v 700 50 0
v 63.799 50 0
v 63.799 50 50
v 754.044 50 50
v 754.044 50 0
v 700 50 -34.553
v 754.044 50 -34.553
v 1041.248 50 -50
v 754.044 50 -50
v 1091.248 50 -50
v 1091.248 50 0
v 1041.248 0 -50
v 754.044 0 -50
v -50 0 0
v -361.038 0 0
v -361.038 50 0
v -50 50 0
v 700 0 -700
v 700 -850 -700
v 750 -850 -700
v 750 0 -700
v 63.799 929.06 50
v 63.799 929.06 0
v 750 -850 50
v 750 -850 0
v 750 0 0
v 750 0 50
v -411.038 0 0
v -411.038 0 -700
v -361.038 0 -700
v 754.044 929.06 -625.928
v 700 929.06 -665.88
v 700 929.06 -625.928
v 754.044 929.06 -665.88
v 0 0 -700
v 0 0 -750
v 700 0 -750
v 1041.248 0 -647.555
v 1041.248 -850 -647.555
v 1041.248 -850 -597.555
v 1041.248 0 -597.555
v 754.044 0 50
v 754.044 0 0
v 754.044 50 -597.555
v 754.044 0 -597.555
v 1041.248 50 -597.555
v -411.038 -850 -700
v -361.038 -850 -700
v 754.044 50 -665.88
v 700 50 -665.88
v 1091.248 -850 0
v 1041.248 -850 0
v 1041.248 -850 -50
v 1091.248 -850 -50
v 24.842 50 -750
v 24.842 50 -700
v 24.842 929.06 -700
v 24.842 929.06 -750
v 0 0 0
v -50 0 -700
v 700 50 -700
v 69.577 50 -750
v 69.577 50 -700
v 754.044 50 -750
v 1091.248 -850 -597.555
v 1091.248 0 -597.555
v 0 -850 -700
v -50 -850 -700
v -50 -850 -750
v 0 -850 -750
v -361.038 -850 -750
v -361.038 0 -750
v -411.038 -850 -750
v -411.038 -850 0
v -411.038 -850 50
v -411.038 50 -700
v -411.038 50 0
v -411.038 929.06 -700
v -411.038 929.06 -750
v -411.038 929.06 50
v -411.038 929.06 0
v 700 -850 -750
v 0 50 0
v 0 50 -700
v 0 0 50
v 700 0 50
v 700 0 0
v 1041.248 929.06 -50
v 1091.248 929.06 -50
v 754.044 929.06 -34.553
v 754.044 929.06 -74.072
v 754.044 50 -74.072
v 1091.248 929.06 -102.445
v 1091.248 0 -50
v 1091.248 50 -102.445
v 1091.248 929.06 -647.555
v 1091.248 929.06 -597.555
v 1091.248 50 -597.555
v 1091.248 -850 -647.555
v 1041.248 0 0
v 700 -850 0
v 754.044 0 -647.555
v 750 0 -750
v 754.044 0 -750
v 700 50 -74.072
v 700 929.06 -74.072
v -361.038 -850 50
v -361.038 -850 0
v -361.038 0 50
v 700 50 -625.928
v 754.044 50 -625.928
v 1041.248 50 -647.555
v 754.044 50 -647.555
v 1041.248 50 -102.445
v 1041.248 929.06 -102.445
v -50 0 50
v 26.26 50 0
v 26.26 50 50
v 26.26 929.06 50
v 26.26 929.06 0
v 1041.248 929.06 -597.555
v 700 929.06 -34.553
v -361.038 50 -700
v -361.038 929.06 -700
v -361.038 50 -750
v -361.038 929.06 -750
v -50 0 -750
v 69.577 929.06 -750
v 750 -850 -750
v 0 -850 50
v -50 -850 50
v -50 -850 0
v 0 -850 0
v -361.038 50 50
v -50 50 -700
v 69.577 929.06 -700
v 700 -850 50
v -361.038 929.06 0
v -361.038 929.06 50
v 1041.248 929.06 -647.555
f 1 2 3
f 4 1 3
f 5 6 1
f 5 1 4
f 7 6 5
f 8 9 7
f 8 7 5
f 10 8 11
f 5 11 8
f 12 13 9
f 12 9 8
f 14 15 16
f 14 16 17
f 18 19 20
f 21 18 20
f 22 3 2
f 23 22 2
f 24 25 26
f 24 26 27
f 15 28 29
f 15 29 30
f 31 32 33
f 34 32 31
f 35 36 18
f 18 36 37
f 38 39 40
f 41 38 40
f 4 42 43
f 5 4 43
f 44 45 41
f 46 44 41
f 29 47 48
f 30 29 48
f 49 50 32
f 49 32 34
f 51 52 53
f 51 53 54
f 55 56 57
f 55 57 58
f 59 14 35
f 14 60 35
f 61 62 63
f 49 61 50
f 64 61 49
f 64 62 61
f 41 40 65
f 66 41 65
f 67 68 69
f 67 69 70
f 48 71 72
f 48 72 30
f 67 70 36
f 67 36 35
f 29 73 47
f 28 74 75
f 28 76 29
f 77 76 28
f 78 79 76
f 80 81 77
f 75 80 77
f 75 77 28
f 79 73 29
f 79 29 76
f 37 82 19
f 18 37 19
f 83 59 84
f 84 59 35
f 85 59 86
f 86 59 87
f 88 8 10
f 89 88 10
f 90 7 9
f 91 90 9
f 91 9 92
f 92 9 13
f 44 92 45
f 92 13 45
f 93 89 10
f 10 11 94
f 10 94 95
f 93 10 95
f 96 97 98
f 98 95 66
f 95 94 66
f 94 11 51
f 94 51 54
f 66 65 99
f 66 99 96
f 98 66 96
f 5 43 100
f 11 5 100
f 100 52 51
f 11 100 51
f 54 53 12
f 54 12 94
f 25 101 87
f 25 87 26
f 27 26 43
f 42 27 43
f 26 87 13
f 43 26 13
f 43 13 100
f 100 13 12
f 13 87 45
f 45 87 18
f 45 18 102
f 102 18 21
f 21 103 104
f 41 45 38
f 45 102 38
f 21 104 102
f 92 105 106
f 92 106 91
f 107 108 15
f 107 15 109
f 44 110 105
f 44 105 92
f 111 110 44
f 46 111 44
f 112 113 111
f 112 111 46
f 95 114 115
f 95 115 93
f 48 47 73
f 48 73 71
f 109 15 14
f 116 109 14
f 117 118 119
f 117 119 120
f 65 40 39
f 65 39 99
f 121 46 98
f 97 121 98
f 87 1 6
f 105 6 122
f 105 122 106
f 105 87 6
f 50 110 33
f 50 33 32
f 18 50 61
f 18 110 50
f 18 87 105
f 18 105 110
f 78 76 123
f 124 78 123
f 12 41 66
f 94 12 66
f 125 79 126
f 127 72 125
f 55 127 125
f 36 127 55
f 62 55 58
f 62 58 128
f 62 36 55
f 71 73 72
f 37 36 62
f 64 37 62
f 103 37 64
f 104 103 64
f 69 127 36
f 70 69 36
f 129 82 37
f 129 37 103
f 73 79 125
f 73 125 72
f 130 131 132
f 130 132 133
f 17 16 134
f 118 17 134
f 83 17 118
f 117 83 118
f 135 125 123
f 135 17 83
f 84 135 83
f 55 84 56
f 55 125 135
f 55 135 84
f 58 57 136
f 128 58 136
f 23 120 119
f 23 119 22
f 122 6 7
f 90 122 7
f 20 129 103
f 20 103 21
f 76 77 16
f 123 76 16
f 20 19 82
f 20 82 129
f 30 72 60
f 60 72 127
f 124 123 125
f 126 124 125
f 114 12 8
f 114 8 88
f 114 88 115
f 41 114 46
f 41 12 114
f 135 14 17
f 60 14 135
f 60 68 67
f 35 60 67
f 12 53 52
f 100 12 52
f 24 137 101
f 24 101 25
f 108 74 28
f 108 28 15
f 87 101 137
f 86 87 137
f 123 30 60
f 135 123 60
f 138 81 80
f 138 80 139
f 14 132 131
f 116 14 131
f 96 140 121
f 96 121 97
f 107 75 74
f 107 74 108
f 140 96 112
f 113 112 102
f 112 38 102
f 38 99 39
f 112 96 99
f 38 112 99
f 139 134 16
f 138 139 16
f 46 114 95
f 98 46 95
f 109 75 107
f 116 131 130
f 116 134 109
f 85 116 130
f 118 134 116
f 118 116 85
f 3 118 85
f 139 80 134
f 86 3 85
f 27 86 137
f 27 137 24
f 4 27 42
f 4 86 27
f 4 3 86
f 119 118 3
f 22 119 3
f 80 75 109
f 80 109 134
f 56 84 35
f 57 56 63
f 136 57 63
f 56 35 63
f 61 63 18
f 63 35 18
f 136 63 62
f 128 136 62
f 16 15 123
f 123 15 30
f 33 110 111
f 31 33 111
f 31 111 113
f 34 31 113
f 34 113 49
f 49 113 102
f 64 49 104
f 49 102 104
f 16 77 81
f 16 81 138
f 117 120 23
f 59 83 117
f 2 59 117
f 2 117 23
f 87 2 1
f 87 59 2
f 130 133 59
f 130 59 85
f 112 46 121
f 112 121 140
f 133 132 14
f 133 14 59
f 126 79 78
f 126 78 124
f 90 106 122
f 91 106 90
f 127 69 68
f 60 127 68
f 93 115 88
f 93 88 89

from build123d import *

# Parameters (mm, degrees)
CROQUIS1_W              = 700
CROQUIS1_H              = 700
CROQUIS1_W_2            = 287.203756055
CROQUIS1_H_2            = 547.555321307
CROQUIS1_W_3            = 311.038292855
SALIENTE_EXTRUIR1_DEPTH = 50
CROQUIS2_W              = 50
CROQUIS2_H              = 50
SALIENTE_EXTRUIR2_DEPTH = 850
CROQUIS3_W              = 50
CROQUIS3_H              = 50
CROQUIS3_H_2            = 52.444678691
CROQUIS3_W_2            = 44.735144292
CROQUIS3_W_3            = 37.538527074
CROQUIS3_W_4            = 54.044332967
CROQUIS3_H_3            = 39.518840668
CROQUIS3_W_5            = 54.044332968
CROQUIS3_H_4            = 39.951892275
SALIENTE_EXTRUIR3_DEPTH = 879.0597314
CROQUIS4_W              = 50
CROQUIS4_H              = 50
SALIENTE_EXTRUIR4_DEPTH = 850


with BuildPart() as part:
    # Croquis1 → Saliente-Extruir1 (new body)
    with BuildSketch(Plane(origin=(0, 0, 0), x_dir=(1, 0, 0), z_dir=(0, 1, 0))):
        Polygon((-45.955667033, -50), (754.044332967, -50), (754.044332967, 0), (1091.248089022, 0), (1091.248089022, 52.444678693), (1091.248089022, 647.555321307), (754.044332967, 647.555321307), (754.044332967, 750), (-45.955667033, 750), (-411.038292855, 750), (-411.038292855, -50), align=None)
        with Locations((350, 350)):
            Rectangle(CROQUIS1_W, CROQUIS1_H, mode=Mode.SUBTRACT)
        with Locations((897.646210995, 323.777660653)):
            Rectangle(CROQUIS1_W_2, CROQUIS1_H_2, mode=Mode.SUBTRACT)
        with Locations((-205.519146428, 350)):
            Rectangle(CROQUIS1_W_3, CROQUIS1_H, mode=Mode.SUBTRACT)
    extrude(amount=SALIENTE_EXTRUIR1_DEPTH)

    # Croquis2 → Saliente-Extruir2 (add)
    with BuildSketch(Plane.XZ):
        with Locations((-25, 25)):
            Rectangle(CROQUIS2_W, CROQUIS2_H)
        with Locations((725, 25)):
            Rectangle(CROQUIS2_W, CROQUIS2_H)
        with Locations((725, -725)):
            Rectangle(CROQUIS2_W, CROQUIS2_H)
        with Locations((-25, -725)):
            Rectangle(CROQUIS2_W, CROQUIS2_H)
    extrude(amount=SALIENTE_EXTRUIR2_DEPTH)

    # Croquis3 → Saliente-Extruir3 (add)
    with BuildSketch(Plane(origin=(0, 50, 0), x_dir=(1, 0, 0), z_dir=(0, 1, 0))):
        with Locations((-386.038292855, 725)):
            Rectangle(CROQUIS3_W, CROQUIS3_H)
        with Locations((1066.248089022, 622.555321307)):
            Rectangle(CROQUIS3_W, CROQUIS3_H)
        with Locations((1066.248089022, 76.222339346)):
            Rectangle(CROQUIS3_W, CROQUIS3_H_2)
        with Locations((-386.038292855, -25)):
            Rectangle(CROQUIS3_W, CROQUIS3_H)
        with Locations((47.209644204, 725)):
            Rectangle(CROQUIS3_W_2, CROQUIS3_H)
        with Locations((45.029305303, -25)):
            Rectangle(CROQUIS3_W_3, CROQUIS3_H)
        with Locations((727.022166484, 54.312727654)):
            Rectangle(CROQUIS3_W_4, CROQUIS3_H_3)
        with Locations((727.022166484, 645.903798151)):
            Rectangle(CROQUIS3_W_5, CROQUIS3_H_4)
    extrude(amount=SALIENTE_EXTRUIR3_DEPTH)

    # Croquis4 → Saliente-Extruir4 (add)
    with BuildSketch(Plane.XZ):
        with Locations((-386.038292855, 25)):
            Rectangle(CROQUIS4_W, CROQUIS4_H)
        with Locations((-386.038292855, -725)):
            Rectangle(CROQUIS4_W, CROQUIS4_H)
        with Locations((1066.248089022, -622.555321307)):
            Rectangle(CROQUIS4_W, CROQUIS4_H)
        with Locations((1066.248089022, -25)):
            Rectangle(CROQUIS4_W, CROQUIS4_H)
    extrude(amount=SALIENTE_EXTRUIR4_DEPTH)


solid = part.part
